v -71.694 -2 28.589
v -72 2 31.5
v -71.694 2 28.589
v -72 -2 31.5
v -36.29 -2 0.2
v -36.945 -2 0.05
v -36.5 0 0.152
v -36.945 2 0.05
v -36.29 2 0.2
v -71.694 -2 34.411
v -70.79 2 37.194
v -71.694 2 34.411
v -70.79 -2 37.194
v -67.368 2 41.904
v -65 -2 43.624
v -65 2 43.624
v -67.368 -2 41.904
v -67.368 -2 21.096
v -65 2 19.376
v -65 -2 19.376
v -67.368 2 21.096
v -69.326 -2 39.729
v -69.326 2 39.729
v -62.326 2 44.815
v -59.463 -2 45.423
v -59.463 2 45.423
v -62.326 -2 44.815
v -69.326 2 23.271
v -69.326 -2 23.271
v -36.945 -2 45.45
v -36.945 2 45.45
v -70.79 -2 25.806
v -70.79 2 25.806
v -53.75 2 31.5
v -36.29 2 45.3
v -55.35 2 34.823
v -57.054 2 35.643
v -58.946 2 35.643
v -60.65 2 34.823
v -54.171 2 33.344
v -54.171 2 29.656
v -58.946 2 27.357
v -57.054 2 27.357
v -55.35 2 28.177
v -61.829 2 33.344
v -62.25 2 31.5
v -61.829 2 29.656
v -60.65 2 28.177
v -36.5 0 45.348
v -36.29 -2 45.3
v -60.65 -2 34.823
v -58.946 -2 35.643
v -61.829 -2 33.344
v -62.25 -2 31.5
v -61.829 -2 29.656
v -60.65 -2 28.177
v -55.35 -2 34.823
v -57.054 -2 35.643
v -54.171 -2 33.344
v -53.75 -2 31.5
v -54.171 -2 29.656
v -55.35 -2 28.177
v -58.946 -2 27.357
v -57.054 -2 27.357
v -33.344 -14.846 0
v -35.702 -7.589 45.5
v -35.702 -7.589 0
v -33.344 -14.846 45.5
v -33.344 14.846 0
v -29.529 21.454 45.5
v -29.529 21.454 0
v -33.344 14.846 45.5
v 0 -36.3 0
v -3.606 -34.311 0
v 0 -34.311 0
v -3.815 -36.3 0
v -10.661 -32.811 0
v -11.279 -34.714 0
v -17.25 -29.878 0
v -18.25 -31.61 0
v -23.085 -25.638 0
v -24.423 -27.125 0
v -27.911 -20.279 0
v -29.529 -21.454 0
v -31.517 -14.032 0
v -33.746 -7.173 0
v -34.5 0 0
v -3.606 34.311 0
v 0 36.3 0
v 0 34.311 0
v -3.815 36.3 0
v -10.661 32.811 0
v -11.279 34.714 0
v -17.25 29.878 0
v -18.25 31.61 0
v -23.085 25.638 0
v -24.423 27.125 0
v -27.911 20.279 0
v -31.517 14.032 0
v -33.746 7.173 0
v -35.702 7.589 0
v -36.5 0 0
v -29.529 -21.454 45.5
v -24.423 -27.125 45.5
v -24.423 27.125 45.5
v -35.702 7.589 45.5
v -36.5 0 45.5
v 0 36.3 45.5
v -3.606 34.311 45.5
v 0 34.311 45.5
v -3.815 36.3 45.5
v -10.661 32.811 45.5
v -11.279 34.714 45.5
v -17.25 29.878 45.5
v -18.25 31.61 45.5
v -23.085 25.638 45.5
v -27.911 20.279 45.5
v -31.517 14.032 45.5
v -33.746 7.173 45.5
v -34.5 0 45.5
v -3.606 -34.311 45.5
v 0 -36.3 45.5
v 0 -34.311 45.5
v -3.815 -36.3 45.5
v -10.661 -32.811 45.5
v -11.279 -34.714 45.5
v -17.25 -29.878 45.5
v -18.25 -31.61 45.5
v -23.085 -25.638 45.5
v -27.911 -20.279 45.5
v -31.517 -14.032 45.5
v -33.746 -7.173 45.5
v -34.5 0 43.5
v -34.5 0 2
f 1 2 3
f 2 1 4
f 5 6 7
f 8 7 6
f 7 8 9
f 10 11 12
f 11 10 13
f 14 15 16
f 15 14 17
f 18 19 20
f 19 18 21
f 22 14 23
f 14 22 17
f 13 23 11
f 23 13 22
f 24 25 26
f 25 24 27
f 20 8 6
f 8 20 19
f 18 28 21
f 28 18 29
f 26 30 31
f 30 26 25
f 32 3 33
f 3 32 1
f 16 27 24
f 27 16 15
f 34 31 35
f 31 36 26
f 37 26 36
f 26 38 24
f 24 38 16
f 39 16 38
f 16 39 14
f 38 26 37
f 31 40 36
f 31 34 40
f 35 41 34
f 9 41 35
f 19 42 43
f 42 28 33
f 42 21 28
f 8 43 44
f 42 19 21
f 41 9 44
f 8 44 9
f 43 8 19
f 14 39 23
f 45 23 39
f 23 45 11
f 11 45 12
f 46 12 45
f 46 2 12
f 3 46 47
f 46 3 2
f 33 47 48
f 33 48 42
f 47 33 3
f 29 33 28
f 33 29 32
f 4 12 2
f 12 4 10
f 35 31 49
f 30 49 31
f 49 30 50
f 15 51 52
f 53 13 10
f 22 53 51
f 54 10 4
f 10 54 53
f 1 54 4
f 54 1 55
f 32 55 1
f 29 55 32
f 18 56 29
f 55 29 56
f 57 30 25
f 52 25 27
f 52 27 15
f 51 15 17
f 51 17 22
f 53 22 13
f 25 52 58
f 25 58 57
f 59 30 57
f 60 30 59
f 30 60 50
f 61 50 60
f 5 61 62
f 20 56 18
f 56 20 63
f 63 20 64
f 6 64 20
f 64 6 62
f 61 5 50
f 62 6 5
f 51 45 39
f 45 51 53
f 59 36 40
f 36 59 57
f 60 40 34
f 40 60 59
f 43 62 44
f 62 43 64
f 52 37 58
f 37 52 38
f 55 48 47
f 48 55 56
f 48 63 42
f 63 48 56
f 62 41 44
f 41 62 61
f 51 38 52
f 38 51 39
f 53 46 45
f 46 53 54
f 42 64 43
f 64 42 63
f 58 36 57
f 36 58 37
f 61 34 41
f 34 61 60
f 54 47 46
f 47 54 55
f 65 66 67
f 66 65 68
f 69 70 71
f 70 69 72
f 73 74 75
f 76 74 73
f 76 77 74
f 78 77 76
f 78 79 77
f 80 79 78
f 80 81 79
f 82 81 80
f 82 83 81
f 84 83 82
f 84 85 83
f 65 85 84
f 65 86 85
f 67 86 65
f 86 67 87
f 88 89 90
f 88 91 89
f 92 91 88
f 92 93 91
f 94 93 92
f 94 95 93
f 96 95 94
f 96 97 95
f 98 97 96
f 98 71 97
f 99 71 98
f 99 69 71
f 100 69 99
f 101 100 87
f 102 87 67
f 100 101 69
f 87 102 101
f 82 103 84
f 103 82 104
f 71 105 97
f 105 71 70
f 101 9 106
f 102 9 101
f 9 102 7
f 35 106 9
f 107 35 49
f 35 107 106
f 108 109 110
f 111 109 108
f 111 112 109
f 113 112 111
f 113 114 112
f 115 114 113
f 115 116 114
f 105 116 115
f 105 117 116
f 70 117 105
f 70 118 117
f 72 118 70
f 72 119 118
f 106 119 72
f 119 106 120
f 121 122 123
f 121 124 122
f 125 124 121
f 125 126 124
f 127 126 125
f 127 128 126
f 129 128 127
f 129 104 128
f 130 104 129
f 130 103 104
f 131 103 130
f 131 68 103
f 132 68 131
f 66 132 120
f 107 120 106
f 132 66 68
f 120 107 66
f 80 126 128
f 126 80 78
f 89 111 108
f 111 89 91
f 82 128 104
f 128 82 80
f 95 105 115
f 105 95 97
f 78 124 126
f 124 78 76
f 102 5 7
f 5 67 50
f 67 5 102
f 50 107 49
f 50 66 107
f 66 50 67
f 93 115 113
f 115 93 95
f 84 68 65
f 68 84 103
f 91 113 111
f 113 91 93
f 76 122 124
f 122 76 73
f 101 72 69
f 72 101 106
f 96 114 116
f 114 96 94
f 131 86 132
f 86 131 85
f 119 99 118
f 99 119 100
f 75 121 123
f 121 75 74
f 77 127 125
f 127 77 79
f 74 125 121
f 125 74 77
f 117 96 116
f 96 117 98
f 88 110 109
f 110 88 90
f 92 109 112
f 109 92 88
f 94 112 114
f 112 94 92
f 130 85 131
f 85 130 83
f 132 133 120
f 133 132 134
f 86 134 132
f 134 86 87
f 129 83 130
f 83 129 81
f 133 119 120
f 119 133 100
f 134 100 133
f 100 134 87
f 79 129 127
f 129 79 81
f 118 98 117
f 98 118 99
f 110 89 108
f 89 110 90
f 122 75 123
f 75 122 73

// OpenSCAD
//$fn = 100;

mastDia = 69;
thicns = 2;
stepsH = 45.5;
stRad = 14;
holeRad = 8.5/2;

Steps();

module Steps() {


    translate([-thicns - mastDia/2,0, 0]) {
    difference() {
        hull(){
            translate([0,0,thicns]) 
            rotate([90,0,0]) 
            cylinder(r = thicns, h = 2*thicns,center = true);

            translate([stRad-stepsH+10, 0, stepsH-stRad]) 
            rotate([90,0,0]) 
            cylinder(r = stRad, h = 2*thicns,center = true);

            translate([0,0,stepsH-thicns]) 
            rotate([90,0,0]) 
            cylinder(r = thicns, h = 2*thicns,center = true);
        }

        
        translate([stRad-stepsH+10, 0, stepsH-stRad]) 
        rotate([90,0,0]) 
        cylinder(r = holeRad, h = 2*thicns+1,center = true);

    }}

    translate([0, 0, stepsH/2]) {
    difference() {
        cylinder(r = mastDia/2 + thicns, h = stepsH, center = true);
        cylinder(r = mastDia/2 , h = stepsH+1, center = true);
        
        tempA = mastDia+2*thicns;
        translate([tempA/2,0,0]) cube([tempA, tempA, stepsH+1], center = true);
    }
    }
    

}
